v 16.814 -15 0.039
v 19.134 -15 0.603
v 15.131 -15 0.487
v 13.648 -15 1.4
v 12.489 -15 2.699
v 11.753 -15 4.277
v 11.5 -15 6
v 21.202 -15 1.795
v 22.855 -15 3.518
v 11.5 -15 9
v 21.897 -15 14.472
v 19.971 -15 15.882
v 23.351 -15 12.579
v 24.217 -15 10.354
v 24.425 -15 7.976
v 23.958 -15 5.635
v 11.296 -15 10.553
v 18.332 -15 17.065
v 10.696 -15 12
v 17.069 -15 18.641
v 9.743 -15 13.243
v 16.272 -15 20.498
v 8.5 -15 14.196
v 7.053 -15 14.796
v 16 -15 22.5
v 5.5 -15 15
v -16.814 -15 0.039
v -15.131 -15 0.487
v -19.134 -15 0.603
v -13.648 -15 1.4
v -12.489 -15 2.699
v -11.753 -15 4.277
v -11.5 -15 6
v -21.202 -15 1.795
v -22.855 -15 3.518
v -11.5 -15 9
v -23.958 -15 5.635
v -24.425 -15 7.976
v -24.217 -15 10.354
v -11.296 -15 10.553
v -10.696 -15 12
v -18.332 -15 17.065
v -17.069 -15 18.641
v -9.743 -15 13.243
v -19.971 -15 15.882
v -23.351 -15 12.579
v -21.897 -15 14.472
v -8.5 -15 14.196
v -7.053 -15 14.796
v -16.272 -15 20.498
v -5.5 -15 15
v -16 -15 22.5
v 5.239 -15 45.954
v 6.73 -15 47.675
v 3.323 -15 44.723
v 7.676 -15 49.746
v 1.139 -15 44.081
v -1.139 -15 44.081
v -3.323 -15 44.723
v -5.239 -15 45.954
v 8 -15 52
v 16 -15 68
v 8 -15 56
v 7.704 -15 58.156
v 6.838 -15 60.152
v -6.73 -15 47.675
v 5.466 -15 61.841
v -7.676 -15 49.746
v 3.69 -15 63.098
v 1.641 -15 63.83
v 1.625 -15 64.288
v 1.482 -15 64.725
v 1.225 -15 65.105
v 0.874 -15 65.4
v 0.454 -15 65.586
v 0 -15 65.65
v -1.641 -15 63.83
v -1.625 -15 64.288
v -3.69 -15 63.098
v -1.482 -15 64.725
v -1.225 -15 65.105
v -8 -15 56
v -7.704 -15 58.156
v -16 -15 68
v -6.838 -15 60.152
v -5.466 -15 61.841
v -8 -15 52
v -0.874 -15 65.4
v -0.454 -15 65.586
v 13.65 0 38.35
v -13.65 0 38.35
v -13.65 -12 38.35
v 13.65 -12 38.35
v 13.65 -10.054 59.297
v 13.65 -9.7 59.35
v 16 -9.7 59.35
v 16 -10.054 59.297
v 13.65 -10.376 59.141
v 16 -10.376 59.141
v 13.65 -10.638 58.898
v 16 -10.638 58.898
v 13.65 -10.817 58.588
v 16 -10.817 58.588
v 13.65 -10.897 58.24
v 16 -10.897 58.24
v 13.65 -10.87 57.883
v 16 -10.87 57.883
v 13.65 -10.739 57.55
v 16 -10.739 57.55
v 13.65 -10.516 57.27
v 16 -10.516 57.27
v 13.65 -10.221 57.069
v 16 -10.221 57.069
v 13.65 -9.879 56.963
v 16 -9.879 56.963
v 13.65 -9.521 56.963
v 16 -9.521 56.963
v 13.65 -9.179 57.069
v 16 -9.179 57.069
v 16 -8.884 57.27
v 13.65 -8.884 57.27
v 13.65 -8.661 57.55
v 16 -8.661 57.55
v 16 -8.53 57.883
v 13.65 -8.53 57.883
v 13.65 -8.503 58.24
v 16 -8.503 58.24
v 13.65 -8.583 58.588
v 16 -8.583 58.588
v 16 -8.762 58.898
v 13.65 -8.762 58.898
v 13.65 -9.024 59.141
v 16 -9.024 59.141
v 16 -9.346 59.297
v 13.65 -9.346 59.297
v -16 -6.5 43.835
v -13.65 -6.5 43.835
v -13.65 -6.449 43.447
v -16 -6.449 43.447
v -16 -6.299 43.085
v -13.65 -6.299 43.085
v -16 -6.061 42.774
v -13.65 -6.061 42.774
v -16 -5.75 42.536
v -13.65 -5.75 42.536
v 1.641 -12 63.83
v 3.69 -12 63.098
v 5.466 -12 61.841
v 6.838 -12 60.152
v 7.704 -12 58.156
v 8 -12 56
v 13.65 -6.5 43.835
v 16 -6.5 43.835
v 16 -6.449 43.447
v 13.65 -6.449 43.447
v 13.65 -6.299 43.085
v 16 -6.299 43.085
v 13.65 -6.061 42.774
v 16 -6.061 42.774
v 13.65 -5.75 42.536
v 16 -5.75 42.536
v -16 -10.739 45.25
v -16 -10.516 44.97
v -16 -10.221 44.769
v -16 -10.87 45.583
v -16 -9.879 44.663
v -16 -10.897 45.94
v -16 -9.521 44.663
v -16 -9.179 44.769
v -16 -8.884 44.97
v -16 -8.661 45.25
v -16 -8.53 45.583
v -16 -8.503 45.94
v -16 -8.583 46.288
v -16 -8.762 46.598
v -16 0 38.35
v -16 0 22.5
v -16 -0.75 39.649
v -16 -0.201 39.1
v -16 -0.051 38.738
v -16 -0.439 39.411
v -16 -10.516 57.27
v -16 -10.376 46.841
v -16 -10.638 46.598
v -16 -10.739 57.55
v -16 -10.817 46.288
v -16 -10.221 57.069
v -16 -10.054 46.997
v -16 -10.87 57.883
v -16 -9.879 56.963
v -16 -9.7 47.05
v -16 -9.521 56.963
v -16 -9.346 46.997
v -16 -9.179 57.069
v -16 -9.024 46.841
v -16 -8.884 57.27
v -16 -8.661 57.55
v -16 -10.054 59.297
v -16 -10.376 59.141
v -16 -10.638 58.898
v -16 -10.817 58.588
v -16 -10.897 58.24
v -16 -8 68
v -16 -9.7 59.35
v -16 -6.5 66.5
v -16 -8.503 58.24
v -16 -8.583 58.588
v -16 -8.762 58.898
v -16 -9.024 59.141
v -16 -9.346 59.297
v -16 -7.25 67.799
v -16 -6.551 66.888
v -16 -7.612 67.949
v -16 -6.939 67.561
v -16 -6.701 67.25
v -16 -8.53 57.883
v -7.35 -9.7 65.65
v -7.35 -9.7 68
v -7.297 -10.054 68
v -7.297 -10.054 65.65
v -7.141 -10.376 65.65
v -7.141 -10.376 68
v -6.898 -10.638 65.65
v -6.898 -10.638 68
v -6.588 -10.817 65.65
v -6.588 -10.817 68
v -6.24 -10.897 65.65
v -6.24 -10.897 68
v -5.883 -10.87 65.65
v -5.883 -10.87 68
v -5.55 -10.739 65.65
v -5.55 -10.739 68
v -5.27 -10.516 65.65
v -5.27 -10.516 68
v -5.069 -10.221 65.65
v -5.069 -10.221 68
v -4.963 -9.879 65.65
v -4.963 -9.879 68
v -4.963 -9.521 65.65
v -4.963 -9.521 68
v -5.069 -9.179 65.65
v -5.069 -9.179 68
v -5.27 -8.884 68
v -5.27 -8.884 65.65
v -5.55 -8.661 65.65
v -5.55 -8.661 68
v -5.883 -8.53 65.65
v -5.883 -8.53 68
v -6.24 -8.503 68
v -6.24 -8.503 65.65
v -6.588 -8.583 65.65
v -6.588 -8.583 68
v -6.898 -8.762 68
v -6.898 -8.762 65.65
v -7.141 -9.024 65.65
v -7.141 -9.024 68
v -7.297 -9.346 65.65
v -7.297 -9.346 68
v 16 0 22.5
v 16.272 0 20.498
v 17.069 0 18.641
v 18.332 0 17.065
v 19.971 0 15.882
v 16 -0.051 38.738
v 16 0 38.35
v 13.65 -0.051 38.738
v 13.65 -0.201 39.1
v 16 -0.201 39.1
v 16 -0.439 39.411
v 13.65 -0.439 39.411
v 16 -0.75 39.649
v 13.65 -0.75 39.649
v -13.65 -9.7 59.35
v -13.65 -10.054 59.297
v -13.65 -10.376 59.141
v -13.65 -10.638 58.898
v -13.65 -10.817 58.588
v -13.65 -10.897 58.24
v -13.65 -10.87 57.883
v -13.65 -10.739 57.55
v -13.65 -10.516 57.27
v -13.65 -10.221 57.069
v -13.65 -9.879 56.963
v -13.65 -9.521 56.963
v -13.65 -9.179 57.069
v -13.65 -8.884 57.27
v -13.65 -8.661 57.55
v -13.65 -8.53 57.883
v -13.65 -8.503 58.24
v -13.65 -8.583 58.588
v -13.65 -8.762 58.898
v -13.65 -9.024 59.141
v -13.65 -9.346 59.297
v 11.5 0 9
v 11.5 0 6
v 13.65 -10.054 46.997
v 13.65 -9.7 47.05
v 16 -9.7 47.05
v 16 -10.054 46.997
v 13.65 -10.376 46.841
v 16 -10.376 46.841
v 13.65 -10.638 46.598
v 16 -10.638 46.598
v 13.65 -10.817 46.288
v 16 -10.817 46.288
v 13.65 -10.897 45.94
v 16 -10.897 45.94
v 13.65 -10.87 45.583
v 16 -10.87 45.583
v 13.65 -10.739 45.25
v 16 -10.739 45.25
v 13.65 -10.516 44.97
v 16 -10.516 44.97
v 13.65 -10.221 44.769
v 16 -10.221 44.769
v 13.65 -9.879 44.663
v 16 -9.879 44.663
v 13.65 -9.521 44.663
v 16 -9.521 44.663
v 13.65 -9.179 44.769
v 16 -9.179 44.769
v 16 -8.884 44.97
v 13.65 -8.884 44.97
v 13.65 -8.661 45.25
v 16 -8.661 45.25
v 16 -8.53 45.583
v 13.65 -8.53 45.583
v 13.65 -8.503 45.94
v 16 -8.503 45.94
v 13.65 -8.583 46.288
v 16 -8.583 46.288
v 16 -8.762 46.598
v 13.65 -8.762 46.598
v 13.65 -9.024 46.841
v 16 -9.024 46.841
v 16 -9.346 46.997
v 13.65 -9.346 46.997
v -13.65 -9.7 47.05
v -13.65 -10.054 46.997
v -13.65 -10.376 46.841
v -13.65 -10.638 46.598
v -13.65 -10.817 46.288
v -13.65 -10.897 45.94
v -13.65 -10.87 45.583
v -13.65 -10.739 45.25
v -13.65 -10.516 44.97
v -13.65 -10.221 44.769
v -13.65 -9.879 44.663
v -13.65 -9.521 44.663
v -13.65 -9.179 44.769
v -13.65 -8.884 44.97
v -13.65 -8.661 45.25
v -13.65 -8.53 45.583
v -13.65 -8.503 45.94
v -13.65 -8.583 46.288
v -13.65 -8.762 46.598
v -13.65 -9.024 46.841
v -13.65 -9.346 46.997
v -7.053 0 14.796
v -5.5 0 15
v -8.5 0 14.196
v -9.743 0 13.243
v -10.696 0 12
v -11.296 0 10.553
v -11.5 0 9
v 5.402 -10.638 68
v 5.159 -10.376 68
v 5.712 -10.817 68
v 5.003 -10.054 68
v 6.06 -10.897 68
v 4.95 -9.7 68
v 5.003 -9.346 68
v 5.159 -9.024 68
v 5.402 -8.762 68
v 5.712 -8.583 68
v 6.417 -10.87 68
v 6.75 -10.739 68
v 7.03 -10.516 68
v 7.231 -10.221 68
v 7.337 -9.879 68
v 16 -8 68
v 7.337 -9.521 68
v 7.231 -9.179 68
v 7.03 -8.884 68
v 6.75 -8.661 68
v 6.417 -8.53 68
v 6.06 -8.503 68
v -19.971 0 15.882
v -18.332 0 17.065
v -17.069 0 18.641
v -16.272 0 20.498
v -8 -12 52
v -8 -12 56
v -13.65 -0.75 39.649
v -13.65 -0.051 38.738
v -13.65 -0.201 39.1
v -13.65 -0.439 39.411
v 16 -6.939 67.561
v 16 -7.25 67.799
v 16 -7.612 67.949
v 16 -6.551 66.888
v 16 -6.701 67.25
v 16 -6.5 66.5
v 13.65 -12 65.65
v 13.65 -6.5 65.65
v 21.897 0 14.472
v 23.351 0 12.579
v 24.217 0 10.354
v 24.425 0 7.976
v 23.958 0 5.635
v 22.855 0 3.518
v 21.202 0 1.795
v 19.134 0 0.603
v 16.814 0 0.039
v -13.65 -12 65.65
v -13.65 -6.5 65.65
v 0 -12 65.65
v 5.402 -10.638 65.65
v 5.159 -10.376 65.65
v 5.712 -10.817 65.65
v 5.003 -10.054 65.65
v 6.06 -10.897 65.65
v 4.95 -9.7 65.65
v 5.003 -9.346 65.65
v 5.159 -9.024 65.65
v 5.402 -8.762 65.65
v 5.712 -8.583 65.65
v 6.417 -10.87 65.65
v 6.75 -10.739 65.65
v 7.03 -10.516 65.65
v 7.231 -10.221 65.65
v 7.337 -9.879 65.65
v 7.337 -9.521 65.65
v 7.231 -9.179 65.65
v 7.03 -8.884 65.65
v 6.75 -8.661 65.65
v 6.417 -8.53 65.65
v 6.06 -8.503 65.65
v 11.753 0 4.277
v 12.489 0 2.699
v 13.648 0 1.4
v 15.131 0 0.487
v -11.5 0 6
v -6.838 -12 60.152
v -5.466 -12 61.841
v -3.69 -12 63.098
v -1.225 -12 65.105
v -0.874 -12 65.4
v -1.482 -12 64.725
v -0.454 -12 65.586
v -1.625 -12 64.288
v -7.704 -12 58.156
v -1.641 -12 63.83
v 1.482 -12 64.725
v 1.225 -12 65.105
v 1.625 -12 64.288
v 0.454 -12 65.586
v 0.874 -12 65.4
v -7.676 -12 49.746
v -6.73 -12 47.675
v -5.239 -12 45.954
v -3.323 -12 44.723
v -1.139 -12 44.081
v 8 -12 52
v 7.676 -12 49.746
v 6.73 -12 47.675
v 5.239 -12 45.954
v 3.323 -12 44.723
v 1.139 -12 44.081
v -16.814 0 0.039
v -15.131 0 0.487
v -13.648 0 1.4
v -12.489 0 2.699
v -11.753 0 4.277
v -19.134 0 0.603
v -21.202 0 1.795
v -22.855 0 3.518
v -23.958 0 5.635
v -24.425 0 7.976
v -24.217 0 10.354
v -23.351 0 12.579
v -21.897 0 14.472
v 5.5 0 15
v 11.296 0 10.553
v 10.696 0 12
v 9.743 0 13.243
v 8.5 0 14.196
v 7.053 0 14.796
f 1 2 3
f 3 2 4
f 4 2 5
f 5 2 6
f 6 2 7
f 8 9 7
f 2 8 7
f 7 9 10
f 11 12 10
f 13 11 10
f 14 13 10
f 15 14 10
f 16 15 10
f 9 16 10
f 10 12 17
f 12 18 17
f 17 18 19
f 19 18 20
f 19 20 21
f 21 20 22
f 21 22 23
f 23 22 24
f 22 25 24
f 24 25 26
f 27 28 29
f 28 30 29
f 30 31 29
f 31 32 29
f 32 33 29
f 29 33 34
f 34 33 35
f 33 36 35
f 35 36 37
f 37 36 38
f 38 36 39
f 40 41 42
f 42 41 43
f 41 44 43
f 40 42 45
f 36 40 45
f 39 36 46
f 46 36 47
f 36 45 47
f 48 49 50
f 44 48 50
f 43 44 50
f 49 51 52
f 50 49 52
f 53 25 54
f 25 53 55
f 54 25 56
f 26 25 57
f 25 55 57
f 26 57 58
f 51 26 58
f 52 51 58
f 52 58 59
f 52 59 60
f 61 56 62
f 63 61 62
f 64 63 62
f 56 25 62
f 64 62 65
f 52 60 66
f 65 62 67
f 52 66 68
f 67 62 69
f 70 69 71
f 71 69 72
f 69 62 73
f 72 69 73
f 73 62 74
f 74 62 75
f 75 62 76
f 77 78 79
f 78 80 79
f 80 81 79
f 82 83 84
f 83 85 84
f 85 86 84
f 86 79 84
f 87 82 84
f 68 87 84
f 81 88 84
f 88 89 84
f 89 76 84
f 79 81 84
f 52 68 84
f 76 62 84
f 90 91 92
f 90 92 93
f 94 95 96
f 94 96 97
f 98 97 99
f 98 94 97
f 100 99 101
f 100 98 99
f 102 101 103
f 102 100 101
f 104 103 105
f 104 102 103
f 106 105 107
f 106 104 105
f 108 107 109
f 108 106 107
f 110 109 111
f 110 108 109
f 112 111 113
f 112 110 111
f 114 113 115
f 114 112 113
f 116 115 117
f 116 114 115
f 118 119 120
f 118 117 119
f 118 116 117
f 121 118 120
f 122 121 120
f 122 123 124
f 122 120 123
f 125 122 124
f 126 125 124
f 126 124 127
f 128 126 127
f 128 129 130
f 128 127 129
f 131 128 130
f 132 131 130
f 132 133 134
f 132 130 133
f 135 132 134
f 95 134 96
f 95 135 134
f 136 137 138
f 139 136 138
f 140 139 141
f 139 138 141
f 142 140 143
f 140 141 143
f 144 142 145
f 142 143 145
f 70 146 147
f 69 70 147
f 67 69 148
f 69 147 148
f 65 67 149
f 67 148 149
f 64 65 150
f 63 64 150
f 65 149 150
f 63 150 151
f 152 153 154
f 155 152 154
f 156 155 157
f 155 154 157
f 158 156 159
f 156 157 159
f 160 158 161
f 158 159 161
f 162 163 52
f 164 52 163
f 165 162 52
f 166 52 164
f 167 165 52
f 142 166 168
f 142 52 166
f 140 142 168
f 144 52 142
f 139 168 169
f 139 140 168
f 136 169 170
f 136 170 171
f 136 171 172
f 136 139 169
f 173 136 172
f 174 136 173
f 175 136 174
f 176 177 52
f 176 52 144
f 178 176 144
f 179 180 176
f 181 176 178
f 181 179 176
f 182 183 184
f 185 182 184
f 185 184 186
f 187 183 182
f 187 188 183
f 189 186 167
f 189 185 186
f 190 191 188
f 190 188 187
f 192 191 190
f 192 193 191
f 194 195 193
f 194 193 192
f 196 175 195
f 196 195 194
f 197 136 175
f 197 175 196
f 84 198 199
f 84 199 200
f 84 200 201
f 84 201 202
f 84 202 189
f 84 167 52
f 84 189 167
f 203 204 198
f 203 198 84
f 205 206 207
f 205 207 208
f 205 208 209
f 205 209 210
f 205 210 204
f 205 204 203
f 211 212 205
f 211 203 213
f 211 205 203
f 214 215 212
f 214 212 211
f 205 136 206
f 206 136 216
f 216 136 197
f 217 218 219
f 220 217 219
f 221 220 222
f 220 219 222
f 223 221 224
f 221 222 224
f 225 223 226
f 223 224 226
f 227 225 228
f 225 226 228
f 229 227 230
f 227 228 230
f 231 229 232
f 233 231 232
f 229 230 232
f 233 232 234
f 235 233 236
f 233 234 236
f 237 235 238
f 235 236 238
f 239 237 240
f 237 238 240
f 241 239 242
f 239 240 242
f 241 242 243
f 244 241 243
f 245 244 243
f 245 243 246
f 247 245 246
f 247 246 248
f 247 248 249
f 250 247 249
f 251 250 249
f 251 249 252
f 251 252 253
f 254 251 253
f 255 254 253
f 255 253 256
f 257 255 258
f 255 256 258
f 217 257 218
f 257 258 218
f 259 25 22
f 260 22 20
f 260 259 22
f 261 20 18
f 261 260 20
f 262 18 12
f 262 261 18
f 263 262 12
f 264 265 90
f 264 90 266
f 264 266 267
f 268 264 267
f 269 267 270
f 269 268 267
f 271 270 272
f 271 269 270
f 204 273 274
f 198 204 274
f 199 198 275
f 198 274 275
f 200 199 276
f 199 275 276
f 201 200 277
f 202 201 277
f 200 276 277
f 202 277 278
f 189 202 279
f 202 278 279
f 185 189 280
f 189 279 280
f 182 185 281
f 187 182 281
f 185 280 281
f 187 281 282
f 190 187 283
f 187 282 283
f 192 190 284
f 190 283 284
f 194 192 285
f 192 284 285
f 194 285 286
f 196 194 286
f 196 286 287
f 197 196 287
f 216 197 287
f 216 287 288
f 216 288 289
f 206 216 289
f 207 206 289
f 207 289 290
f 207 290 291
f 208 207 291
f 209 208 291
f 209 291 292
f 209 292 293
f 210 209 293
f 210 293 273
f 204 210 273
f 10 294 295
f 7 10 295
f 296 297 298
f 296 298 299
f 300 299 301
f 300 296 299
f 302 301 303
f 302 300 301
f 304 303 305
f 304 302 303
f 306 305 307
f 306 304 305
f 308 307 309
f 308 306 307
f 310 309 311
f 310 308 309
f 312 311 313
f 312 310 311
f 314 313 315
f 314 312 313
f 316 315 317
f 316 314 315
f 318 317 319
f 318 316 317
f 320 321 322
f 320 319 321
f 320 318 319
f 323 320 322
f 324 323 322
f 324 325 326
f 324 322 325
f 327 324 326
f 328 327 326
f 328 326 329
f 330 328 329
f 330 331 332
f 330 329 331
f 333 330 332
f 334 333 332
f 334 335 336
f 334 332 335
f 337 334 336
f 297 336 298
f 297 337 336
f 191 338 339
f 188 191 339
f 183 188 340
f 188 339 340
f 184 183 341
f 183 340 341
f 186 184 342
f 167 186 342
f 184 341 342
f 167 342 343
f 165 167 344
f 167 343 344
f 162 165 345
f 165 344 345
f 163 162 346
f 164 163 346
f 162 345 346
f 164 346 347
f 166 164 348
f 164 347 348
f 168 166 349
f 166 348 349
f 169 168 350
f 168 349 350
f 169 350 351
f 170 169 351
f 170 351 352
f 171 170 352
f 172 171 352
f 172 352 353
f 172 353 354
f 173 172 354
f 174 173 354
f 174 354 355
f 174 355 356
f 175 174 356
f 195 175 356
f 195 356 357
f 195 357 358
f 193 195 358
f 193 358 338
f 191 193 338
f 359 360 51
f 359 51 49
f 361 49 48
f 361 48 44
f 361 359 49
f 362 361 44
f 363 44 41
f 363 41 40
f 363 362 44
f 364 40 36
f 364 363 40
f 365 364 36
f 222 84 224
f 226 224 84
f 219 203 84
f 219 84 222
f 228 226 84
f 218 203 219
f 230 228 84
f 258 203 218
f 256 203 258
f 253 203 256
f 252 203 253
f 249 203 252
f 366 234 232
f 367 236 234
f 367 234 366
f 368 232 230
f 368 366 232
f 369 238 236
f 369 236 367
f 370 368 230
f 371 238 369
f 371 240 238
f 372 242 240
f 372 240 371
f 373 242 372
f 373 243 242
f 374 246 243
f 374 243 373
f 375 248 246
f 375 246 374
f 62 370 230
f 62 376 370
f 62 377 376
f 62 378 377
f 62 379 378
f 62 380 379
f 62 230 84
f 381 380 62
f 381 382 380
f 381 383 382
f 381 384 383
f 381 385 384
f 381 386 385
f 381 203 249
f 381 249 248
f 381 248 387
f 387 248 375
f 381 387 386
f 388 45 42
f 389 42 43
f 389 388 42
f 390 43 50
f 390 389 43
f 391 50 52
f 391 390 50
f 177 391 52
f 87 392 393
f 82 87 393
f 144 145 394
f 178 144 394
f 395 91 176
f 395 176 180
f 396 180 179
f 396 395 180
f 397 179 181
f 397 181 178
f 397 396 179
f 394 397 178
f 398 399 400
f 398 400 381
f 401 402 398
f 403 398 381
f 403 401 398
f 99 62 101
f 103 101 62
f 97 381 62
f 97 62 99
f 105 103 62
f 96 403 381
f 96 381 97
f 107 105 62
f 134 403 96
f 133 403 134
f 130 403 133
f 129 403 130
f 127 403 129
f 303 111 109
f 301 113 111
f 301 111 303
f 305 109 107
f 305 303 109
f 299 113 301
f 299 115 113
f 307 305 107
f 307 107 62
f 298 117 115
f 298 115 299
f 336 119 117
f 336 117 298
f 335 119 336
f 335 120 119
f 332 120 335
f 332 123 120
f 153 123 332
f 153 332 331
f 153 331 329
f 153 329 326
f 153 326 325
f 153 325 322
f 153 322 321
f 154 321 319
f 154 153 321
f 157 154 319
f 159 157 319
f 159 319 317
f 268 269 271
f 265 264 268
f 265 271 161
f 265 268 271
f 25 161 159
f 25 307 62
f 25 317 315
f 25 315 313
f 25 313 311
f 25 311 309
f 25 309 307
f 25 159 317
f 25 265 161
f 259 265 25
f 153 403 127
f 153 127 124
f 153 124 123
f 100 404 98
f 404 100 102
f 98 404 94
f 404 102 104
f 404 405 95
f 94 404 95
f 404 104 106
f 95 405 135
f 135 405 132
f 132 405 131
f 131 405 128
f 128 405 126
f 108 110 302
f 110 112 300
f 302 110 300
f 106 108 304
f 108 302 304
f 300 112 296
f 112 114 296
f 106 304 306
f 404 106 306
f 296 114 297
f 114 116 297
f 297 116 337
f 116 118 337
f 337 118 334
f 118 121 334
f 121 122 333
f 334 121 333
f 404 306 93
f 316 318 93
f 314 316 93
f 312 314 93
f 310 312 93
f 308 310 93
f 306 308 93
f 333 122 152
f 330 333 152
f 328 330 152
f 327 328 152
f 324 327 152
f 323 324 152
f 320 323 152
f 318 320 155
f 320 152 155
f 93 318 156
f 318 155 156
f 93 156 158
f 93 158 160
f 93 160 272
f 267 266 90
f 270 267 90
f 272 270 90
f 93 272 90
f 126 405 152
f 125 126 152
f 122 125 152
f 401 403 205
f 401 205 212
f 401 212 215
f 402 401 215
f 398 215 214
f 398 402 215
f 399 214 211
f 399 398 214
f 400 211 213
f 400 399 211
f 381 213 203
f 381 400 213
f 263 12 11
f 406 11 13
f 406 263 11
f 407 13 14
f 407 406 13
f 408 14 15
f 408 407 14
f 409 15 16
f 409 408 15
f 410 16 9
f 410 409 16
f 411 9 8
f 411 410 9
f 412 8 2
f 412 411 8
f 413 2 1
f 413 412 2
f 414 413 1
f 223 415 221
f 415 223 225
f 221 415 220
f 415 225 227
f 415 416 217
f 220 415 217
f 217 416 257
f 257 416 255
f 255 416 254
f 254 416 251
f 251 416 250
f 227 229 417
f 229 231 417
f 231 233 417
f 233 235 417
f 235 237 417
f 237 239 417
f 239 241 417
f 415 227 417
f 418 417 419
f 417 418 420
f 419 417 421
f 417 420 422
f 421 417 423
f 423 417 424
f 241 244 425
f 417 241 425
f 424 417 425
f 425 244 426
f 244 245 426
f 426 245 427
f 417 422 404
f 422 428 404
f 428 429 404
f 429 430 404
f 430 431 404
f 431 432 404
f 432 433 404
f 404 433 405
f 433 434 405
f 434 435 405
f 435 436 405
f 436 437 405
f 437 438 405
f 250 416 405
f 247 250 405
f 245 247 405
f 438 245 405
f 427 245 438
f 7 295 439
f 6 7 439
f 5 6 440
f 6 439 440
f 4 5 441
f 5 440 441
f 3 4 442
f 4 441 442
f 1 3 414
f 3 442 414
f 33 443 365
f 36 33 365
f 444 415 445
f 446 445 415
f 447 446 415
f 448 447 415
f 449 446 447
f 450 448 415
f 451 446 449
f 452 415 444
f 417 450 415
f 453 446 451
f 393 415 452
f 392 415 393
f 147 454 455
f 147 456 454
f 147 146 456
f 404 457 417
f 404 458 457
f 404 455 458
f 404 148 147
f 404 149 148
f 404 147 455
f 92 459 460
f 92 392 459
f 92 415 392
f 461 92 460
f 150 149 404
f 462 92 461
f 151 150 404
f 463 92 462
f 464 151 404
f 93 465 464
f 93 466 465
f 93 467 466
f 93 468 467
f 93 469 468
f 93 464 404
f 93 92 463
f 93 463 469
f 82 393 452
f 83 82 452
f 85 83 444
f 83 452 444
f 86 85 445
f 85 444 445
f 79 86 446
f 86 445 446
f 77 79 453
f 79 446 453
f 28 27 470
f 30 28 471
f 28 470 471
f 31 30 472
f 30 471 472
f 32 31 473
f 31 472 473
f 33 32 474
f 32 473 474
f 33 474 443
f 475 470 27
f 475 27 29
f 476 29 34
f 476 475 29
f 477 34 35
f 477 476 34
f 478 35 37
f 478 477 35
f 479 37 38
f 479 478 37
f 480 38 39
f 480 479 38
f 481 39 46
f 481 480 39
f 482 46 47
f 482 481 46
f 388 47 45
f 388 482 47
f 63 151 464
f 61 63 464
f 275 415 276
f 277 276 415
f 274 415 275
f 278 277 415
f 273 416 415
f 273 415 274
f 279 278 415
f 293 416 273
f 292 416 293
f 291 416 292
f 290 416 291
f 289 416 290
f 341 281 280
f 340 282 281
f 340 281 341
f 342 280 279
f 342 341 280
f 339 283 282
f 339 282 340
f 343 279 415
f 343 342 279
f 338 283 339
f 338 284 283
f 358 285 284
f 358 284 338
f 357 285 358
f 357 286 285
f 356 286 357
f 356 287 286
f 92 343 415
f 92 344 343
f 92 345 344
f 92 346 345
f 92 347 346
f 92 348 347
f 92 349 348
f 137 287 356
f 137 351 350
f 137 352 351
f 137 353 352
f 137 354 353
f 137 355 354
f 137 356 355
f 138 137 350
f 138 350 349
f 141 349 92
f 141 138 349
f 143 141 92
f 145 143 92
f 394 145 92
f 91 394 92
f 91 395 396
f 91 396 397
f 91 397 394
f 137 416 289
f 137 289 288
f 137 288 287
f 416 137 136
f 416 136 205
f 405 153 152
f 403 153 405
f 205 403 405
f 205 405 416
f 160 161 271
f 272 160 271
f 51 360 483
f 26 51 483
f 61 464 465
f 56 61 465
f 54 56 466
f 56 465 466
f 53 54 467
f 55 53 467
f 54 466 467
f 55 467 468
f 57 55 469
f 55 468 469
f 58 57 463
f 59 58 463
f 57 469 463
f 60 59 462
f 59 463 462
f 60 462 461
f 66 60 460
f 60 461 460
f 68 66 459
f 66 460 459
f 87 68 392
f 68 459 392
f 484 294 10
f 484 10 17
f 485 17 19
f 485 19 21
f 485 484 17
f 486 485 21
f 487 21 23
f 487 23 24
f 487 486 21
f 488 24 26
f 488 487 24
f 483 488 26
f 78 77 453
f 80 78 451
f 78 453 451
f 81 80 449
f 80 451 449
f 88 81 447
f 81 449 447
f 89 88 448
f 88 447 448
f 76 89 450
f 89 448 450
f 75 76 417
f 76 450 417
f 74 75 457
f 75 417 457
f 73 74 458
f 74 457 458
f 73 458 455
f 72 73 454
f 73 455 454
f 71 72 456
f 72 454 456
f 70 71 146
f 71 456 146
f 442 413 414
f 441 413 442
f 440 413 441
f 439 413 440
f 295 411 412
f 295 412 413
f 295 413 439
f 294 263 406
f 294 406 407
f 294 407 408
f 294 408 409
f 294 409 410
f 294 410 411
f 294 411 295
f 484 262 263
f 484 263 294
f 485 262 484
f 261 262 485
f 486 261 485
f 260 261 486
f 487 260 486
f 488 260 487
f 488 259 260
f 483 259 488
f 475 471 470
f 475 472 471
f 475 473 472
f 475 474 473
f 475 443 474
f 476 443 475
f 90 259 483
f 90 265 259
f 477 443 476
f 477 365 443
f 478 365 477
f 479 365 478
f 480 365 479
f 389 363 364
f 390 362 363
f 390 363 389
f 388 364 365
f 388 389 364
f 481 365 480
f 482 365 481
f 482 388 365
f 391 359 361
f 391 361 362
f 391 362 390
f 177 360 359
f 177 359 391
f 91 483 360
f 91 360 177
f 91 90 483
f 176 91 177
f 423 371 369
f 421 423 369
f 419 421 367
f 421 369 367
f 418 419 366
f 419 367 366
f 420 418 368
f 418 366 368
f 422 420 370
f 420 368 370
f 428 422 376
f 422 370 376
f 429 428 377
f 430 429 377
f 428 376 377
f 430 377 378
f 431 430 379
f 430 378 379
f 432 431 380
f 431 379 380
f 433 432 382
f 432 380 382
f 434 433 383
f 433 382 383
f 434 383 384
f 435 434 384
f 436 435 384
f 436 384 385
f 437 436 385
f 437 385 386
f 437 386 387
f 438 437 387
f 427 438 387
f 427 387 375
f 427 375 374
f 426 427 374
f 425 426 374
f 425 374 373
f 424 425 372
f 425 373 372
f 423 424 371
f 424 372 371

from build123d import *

# Parameters (mm, degrees)
PAD008_DEPTH         = 15
SKETCH021_W          = 27.3
SKETCH021_H          = 27.3
POCKET006_DEPTH      = 12
POCKET007_DEPTH      = 5
SKETCH023_R          = 3.3665
POCKET008_DEPTH      = 68.001
SKETCH024_R          = 1.2
POCKET009_DEPTH      = 2.35
SKETCH026_R          = 1.2
POCKET010_DEPTH      = 33.951
POCKET010_DEPTH_BACK = 61.251
POCKET011_DEPTH      = 63.601
POCKET015_DEPTH      = 15.001
POCKET016_DEPTH      = 15.001


with BuildPart() as part:
    # Sketch020 → Pad008 (new body)
    with BuildSketch(Plane.XZ):
        with BuildLine():
            Line((-47.6, 1.5), (-47.6, 13.5))
            ThreePointArc((-46.1, 15), (-47.1606601718, 14.5606601718), (-47.6, 13.5))
            Line((-46.1, 15), (-23.5, 15))
            ThreePointArc((-23.5, 15), (-18.1966991411, 17.1966991411), (-16, 22.5))
            Line((-16, 22.5), (-16, 68))
            Line((-16, 68), (16, 68))
            Line((16, 68), (16, 22.5))
            ThreePointArc((16, 22.5), (18.1966991411, 17.1966991411), (23.5, 15))
            Line((23.5, 15), (46.1, 15))
            ThreePointArc((47.6, 13.5), (47.1606601718, 14.5606601718), (46.1, 15))
            Line((47.6, 13.5), (47.6, 1.5))
            ThreePointArc((46.1, 0), (47.1606601718, 0.4393398282), (47.6, 1.5))
            Line((46.1, 0), (17.5, 0))
            ThreePointArc((11.5, 6), (13.2573593129, 1.7573593129), (17.5, 0))
            Line((11.5, 9), (11.5, 6))
            ThreePointArc((11.5, 9), (9.7426406871, 13.2426406871), (5.5, 15))
            Line((-5.5, 15), (5.5, 15))
            ThreePointArc((-5.5, 15), (-9.7426406871, 13.2426406871), (-11.5, 9))
            Line((-11.5, 6), (-11.5, 9))
            ThreePointArc((-17.5, 0), (-13.2573593129, 1.7573593129), (-11.5, 6))
            Line((-17.5, 0), (-46.1, 0))
            ThreePointArc((-47.6, 1.5), (-47.1606601718, 0.4393398282), (-46.1, 0))
        make_face()
    extrude(amount=PAD008_DEPTH)

    # Sketch021 (on Face23 of Pad008) → Pocket006 (cut)
    with BuildSketch(Plane(origin=(0, 0, 0), x_dir=(1, 0, 0), z_dir=(0, 1, 0))):
        with Locations((0, -52)):
            Rectangle(SKETCH021_W, SKETCH021_H)
    extrude(amount=-POCKET006_DEPTH, mode=Mode.SUBTRACT)

    # Sketch022 (on Face29 of Pocket006) → Pocket007 (cut)
    with BuildSketch(Plane(origin=(0, -12, 0), x_dir=(1, 0, 0), z_dir=(0, 1, 0))):
        with BuildLine():
            ThreePointArc((-8, -56.0000000001), (-6.2100572838, -61.0433310949), (-1.6412028669, -63.8298437501))
            ThreePointArc((-1.6412028669, -63.8298437501), (0, -65.65), (1.6412028669, -63.8298437501))
            ThreePointArc((1.6412028669, -63.8298437501), (6.2100482063, -61.0433422724), (7.9999999999, -56.0000287985))
            Line((7.9999999999, -56.0000287985), (7.9999999999, -52.0000000001))
            ThreePointArc((8, -52.0000000001), (0, -44.0000000001), (-8, -52.0000000001))
            Line((-8, -52.0000000001), (-8, -56.0000000001))
        make_face()
    extrude(amount=-POCKET007_DEPTH, mode=Mode.SUBTRACT)

    # Sketch023 (on Face22 of Pocket007) → Pocket008 (cut, through all)
    with BuildSketch(Plane(origin=(0, 0, 0), x_dir=(1, 0, 0), z_dir=(0, 0, -1))):
        with Locations((38.1, 7.5)):
            Circle(SKETCH023_R)
        with Locations((-38.1, 7.5)):
            Circle(SKETCH023_R)
    extrude(amount=-POCKET008_DEPTH, mode=Mode.SUBTRACT)

    # Sketch024 (on Face13 of Pocket008) → Pocket009 (cut)
    with BuildSketch(Plane(origin=(0, 0, 68), x_dir=(-1, 0, 0), z_dir=(0, 0, 1))):
        with Locations((-6.15, 9.7)):
            Circle(SKETCH024_R)
        with Locations((6.15, 9.7)):
            Circle(SKETCH024_R)
    extrude(amount=-POCKET009_DEPTH, mode=Mode.SUBTRACT)

    # Sketch026 (on Face27 of Pocket009) → Pocket010 (cut, two sides)
    with BuildSketch(Plane(origin=(-13.65, 0, 0), x_dir=(0, 0, 1), z_dir=(1, 0, 0))) as pocket010_sk:
        with Locations((45.85, 9.7)):
            Circle(SKETCH026_R)
        with Locations((58.15, 9.7)):
            Circle(SKETCH026_R)
    extrude(amount=-POCKET010_DEPTH, mode=Mode.SUBTRACT)
    extrude(pocket010_sk.sketch, amount=POCKET010_DEPTH_BACK, mode=Mode.SUBTRACT)

    # Sketch027 (on Face15 of Pocket010) → Pocket011 (cut, through all)
    with BuildSketch(Plane(origin=(16, 0, 0), x_dir=(0, 0, 1), z_dir=(1, 0, 0))):
        with BuildLine():
            ThreePointArc((66.5, 6.5), (67.5606601718, 6.9393398282), (68, 8))
            Line((68, 8), (68, 0))
            Line((68, 0), (38.35, 0))
            ThreePointArc((38.35, 0), (39.1, 0.2009618943), (39.6490381057, 0.75))
            Line((42.5357894517, 5.75), (39.6490381057, 0.75))
            ThreePointArc((43.8348275573, 6.5), (43.0848275573, 6.2990381057), (42.5357894517, 5.75))
            Line((43.8348275573, 6.5), (66.5, 6.5))
        make_face()
    extrude(amount=-POCKET011_DEPTH, mode=Mode.SUBTRACT)

    # Sketch033 (on Face4 of Pocket011) → Pocket015 (cut, through all)
    with BuildSketch(Plane(origin=(0, 0, 0), x_dir=(1, 0, 0), z_dir=(0, 1, 0))):
        with BuildLine():
            ThreePointArc((19.9705882353, -15.8823529412), (24.185577345, -6.3911056638), (16, 0))
            Line((51, 0), (16, 0))
            Line((51, -22.5), (51, 0))
            Line((16, -22.5), (51, -22.5))
            ThreePointArc((19.9705882353, -15.8823529412), (17.0688030572, -18.6412818343), (16, -22.5))
        make_face()
    extrude(amount=-POCKET015_DEPTH, mode=Mode.SUBTRACT)

    # Sketch034 (on Face4 of Pocket015) → Pocket016 (cut, through all)
    with BuildSketch(Plane(origin=(0, 0, 0), x_dir=(1, 0, 0), z_dir=(0, 1, 0))):
        with BuildLine():
            ThreePointArc((-16, -1e-10), (-24.1855982279, -6.3910932116), (-19.9706006156, -15.8823463383))
            ThreePointArc((-16, -22.5), (-17.0688066666, -18.6412758186), (-19.9706006156, -15.8823463384))
            Line((-16, -22.5), (-51, -22.5))
            Line((-51, -22.5), (-51, -1e-10))
            Line((-51, -1e-10), (-16, -1e-10))
        make_face()
    extrude(amount=-POCKET016_DEPTH, mode=Mode.SUBTRACT)


solid = part.part
